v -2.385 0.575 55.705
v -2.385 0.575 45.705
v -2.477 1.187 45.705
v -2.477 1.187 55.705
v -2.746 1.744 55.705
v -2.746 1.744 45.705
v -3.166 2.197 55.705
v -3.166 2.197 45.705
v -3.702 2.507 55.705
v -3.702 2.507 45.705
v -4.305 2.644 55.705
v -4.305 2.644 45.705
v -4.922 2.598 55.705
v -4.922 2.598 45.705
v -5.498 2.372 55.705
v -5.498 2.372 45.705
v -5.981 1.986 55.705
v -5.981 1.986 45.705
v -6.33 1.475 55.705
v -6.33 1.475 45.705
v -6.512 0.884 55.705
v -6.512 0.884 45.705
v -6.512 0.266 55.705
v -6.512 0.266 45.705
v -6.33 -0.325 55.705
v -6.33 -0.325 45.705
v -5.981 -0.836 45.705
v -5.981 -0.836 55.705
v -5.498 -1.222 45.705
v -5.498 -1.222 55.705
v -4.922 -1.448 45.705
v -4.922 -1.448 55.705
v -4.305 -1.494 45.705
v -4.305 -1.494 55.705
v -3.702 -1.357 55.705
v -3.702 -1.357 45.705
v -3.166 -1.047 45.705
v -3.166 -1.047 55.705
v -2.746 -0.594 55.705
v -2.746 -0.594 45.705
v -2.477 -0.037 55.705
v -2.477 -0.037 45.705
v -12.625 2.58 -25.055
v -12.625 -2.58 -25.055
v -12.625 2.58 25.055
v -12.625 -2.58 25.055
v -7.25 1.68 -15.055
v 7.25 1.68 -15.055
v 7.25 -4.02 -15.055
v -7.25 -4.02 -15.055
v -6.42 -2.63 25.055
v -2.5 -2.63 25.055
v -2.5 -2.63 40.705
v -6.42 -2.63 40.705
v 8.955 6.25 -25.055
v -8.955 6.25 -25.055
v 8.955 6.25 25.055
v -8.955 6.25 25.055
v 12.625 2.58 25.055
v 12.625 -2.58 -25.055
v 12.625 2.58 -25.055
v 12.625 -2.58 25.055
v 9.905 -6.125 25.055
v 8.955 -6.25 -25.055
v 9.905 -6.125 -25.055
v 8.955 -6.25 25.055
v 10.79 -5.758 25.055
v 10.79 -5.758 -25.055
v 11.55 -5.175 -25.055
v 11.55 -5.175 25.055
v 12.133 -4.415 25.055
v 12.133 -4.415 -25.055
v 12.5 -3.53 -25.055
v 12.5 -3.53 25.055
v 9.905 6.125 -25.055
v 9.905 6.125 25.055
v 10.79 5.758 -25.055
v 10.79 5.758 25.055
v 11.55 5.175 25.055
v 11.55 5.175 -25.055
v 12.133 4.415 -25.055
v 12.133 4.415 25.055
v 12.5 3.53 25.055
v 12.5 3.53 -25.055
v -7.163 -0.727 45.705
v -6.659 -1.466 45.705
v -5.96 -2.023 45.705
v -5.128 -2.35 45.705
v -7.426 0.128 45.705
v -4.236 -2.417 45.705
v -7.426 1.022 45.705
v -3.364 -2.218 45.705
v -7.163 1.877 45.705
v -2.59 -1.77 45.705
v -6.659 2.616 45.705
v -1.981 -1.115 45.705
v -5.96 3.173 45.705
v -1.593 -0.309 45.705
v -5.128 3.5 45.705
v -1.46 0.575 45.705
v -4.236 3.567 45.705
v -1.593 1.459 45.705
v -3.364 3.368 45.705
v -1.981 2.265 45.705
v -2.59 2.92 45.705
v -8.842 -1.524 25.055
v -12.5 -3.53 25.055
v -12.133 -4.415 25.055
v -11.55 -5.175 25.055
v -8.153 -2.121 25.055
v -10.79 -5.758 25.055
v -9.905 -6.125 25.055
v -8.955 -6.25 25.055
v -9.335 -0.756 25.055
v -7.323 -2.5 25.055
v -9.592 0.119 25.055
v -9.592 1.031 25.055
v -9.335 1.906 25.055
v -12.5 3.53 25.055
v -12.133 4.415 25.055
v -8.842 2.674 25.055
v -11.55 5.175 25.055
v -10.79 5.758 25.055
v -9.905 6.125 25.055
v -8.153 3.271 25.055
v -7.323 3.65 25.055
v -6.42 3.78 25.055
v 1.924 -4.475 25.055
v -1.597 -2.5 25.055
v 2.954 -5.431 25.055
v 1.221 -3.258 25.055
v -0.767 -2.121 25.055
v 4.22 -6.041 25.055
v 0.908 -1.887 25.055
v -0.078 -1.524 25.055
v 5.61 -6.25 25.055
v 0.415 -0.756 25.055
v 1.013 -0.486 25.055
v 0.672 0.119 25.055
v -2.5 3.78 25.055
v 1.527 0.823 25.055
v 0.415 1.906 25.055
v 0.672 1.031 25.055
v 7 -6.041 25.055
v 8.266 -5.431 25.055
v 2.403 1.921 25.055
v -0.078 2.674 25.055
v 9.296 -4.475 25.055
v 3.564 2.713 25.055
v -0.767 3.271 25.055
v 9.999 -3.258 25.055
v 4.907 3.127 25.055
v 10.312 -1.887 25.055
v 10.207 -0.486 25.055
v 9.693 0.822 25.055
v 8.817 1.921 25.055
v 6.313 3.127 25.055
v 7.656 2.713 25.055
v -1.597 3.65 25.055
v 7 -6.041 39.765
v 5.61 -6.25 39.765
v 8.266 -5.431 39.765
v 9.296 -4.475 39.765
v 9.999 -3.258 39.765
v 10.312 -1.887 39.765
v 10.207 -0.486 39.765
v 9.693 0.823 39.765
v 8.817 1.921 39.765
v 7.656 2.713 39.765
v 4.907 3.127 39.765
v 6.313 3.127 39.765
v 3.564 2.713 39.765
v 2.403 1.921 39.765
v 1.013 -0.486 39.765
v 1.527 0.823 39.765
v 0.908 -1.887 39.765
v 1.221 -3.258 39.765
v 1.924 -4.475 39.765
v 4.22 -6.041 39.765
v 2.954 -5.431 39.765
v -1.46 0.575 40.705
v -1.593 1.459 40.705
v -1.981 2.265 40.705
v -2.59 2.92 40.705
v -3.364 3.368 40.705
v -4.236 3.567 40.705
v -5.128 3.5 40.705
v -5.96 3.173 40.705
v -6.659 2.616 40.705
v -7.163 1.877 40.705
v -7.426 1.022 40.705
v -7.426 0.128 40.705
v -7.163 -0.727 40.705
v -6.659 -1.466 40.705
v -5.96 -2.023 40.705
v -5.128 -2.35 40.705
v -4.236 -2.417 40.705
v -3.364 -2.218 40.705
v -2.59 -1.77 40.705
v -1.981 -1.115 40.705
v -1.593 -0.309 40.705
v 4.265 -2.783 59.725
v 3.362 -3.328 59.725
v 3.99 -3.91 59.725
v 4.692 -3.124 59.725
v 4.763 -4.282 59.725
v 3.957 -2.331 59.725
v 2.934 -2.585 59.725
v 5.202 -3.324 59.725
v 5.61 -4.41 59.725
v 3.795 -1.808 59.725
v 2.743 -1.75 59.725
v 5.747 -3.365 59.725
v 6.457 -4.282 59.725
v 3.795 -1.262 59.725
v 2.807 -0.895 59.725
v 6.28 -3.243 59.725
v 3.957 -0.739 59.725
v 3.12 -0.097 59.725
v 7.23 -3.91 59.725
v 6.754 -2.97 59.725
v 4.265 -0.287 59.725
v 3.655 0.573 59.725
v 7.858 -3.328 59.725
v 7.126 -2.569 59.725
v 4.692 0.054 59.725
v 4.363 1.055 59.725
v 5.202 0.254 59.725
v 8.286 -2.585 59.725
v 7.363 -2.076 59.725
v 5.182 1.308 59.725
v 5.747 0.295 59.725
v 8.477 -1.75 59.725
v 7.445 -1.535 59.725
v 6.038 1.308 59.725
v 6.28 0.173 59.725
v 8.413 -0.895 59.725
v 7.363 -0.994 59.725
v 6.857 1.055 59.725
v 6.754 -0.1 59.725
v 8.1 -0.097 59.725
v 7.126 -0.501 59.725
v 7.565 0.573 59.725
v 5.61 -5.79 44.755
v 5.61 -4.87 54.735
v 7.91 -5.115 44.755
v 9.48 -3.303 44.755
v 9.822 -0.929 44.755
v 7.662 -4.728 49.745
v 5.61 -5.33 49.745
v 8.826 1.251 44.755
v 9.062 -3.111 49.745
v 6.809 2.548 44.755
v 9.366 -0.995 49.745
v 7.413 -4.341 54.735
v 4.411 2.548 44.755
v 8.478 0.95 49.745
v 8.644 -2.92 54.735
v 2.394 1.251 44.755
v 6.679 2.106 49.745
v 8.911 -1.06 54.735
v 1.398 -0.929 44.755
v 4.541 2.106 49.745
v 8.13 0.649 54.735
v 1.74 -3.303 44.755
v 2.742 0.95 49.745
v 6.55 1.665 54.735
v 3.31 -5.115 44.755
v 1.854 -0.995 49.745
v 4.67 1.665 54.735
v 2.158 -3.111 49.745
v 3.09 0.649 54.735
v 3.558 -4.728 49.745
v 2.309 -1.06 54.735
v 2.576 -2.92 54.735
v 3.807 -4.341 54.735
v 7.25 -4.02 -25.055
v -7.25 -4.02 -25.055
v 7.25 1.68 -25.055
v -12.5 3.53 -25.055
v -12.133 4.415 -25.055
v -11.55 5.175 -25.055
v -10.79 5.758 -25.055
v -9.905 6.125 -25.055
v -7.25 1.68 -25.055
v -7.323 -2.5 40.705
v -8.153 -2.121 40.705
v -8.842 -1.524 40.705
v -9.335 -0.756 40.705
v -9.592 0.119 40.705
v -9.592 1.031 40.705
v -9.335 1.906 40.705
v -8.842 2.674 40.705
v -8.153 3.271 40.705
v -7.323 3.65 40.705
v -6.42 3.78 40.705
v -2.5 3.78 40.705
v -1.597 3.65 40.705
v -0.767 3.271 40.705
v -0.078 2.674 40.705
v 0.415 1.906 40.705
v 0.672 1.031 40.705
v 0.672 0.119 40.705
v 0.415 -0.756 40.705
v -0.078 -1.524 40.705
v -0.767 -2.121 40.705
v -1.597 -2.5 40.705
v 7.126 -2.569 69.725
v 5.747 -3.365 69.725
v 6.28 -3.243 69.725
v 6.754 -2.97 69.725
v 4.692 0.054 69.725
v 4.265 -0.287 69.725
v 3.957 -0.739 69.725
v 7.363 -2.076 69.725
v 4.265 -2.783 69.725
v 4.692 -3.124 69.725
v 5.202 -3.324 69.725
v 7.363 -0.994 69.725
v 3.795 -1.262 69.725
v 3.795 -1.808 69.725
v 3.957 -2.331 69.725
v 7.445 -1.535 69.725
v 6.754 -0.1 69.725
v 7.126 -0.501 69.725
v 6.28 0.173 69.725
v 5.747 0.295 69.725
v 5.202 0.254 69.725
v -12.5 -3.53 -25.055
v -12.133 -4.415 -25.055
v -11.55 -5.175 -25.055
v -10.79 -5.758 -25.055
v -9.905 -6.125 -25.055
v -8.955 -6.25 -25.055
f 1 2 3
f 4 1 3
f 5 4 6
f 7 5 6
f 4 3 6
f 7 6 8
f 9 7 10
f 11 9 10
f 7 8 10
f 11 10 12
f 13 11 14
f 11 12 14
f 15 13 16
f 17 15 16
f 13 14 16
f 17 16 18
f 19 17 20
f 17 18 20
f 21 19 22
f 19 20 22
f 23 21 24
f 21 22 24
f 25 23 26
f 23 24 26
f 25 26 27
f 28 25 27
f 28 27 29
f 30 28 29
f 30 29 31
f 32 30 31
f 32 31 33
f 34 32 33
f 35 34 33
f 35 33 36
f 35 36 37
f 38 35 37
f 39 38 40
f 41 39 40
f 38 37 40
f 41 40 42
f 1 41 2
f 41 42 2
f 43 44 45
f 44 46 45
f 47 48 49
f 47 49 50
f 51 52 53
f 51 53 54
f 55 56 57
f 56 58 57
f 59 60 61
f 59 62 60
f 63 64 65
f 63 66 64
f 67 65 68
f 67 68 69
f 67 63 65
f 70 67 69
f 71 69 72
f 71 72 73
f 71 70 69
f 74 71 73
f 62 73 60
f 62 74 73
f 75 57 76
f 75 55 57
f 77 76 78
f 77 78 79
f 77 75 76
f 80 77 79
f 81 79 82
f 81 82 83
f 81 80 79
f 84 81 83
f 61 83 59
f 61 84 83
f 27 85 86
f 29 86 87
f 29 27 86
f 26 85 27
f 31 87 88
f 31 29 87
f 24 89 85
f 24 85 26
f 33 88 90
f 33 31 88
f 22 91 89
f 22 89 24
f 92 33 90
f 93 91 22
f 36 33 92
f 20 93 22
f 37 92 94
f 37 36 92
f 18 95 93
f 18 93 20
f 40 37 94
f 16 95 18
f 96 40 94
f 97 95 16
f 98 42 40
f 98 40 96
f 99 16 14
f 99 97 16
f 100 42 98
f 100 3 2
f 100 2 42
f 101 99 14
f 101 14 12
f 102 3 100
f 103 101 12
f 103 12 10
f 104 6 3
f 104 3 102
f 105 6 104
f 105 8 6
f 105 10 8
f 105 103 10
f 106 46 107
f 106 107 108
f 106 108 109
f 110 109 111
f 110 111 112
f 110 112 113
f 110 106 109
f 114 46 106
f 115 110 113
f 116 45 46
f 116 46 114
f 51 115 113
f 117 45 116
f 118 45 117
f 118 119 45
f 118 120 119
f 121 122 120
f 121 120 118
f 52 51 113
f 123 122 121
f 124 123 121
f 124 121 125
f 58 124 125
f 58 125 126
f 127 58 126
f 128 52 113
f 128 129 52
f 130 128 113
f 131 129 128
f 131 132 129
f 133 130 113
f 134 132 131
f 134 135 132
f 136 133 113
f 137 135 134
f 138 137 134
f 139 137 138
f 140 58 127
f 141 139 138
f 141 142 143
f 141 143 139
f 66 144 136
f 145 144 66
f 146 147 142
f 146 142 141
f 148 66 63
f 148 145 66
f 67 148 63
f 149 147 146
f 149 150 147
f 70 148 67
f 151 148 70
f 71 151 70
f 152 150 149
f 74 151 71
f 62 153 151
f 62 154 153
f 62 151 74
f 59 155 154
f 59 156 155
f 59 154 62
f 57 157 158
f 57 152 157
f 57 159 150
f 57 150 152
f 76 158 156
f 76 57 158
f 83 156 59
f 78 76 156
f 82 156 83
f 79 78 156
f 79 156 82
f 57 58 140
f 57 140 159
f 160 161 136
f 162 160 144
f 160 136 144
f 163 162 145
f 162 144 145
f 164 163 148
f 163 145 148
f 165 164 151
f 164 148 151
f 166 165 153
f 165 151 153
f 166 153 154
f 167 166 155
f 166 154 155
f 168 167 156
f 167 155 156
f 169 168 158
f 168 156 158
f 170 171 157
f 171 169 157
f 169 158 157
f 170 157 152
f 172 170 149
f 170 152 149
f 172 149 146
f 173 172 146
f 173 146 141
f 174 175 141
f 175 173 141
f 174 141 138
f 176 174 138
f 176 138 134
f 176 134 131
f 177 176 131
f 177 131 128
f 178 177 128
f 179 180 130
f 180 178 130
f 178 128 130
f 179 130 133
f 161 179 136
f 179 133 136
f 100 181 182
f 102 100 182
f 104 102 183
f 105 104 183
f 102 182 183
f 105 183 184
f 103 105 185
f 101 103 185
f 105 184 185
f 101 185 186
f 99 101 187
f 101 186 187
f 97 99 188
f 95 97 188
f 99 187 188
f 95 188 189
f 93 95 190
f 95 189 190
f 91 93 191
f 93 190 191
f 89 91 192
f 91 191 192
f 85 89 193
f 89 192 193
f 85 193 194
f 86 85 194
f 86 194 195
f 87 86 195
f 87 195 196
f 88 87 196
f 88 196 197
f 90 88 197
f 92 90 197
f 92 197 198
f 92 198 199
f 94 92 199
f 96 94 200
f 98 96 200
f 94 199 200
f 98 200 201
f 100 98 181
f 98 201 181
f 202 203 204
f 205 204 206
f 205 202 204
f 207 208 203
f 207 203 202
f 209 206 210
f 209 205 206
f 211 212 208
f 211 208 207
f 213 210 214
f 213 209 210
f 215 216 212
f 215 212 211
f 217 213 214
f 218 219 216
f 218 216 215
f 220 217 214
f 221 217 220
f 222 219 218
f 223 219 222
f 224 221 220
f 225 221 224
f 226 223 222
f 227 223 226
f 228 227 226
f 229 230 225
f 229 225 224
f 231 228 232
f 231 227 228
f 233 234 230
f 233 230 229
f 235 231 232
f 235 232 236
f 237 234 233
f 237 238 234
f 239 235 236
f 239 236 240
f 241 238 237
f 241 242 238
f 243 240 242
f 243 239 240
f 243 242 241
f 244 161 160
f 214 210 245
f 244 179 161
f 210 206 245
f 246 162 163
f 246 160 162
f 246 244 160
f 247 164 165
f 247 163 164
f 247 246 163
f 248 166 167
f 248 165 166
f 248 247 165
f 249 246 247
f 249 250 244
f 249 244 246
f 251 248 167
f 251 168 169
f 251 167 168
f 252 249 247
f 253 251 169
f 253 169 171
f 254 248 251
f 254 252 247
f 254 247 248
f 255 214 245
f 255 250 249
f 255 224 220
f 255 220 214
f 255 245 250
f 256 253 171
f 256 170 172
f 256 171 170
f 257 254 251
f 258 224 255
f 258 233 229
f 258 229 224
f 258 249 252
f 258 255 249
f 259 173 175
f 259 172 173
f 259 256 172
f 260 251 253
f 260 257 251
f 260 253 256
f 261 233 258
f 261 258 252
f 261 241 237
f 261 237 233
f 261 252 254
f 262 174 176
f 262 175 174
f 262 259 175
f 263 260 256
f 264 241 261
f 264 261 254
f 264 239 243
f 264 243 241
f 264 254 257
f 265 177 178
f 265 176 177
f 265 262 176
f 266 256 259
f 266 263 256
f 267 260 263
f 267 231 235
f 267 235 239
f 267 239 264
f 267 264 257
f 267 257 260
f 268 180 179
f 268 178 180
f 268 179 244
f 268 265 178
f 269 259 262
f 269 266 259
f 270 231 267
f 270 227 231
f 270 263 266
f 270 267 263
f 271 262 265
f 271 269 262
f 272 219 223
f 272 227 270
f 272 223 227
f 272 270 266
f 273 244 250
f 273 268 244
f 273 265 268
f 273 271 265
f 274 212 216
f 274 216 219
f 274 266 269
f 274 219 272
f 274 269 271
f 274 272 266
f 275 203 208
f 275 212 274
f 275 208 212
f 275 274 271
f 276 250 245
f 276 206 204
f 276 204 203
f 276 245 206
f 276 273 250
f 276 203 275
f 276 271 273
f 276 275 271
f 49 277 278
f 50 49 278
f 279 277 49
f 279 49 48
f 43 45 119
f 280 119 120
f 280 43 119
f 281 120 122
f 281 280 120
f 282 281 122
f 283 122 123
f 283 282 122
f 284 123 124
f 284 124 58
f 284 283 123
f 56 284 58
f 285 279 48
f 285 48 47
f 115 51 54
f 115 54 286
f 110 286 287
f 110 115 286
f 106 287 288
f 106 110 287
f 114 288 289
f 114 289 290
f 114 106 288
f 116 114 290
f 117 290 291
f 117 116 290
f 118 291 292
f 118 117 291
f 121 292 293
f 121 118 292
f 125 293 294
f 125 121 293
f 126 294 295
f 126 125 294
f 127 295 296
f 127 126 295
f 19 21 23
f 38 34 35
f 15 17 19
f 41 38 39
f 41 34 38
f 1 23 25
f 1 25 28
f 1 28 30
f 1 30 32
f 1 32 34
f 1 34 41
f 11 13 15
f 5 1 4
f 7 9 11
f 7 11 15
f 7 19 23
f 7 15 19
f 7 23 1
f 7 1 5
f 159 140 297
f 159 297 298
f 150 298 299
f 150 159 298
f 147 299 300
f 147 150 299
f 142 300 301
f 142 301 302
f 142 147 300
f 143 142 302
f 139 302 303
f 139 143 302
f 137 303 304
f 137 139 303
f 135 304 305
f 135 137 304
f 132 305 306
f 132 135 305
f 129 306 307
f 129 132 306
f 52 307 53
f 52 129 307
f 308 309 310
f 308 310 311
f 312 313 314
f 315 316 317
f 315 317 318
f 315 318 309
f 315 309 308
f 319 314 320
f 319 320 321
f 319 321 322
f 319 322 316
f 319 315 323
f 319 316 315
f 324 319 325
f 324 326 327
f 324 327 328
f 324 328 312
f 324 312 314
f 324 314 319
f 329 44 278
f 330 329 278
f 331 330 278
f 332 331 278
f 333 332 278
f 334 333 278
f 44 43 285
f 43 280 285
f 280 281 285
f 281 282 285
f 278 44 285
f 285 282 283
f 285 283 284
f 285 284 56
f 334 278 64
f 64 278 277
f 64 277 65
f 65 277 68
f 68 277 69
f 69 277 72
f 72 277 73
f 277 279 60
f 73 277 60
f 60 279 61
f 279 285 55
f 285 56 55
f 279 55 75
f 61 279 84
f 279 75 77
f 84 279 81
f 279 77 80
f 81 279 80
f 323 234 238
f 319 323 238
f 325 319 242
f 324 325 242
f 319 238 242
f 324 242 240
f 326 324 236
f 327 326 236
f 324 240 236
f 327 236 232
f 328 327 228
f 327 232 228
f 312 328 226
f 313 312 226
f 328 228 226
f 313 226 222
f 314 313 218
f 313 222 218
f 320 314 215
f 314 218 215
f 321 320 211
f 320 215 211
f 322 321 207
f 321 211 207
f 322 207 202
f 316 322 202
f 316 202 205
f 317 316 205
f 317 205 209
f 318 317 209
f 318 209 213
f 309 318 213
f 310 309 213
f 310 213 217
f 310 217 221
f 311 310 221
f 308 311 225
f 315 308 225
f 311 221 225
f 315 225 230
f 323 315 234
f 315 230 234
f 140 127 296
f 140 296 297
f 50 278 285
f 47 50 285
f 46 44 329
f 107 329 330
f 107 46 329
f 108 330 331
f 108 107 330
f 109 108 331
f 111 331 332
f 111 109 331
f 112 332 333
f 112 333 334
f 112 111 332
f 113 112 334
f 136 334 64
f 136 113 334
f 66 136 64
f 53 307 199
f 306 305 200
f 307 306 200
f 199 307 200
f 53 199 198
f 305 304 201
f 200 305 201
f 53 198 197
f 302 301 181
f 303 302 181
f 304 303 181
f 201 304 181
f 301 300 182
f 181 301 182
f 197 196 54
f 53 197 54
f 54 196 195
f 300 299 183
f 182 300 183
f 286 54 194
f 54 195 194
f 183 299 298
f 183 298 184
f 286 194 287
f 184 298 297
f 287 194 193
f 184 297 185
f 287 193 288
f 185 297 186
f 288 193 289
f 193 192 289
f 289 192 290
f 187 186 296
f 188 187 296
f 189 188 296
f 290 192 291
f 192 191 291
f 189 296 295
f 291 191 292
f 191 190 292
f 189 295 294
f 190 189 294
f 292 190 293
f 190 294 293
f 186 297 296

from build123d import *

# Parameters (mm, degrees)
SKETCH1_W           = 25.25
SKETCH1_H           = 12.5
BOSS_EXTRUDE1_DEPTH = 25.055
SKETCH2_W           = 14.5
SKETCH2_H           = 5.7
CUT_EXTRUDE1_DEPTH  = 10
BOSS_EXTRUDE2_DEPTH = 15.65
SKETCH4_R           = 4.715
BOSS_EXTRUDE3_DEPTH = 14.71
SKETCH5_R           = 2.875
SKETCH6_R           = 1.835
BOSS_EXTRUDE4_DEPTH = 10
SKETCH7_R           = 3
BOSS_EXTRUDE5_DEPTH = 5
SKETCH8_R           = 2.075
BOSS_EXTRUDE6_DEPTH = 10
FILLET1_R           = 3.67


with BuildPart() as part:
    # Sketch1 → Boss-Extrude1 (new, symmetric)
    with BuildSketch(Plane.XY):
        Rectangle(SKETCH1_W, SKETCH1_H)
    extrude(amount=BOSS_EXTRUDE1_DEPTH, both=True)

    # Sketch2 → Cut-Extrude1 (cut)
    with BuildSketch(Plane(origin=(0, 0, -25.055), x_dir=(-1, 0, 0), z_dir=(0, 0, -1))):
        with Locations((0, -1.17)):
            Rectangle(SKETCH2_W, SKETCH2_H)
    extrude(amount=-CUT_EXTRUDE1_DEPTH, mode=Mode.SUBTRACT)

    # Sketch3 → Boss-Extrude2 (add)
    with BuildSketch(Plane.XY.offset(25.055)):
        with BuildLine():
            Line((-6.42, 3.78), (-2.5, 3.78))
            ThreePointArc((-2.5, 3.78), (0.705, 0.575), (-2.5, -2.63))
            Line((-2.5, -2.63), (-6.42, -2.63))
            ThreePointArc((-6.42, -2.63), (-9.625, 0.575), (-6.42, 3.78))
        make_face()
    extrude(amount=BOSS_EXTRUDE2_DEPTH)

    # Sketch4 → Boss-Extrude3 (add)
    with BuildSketch(Plane.XY.offset(25.055)):
        with Locations(Location((5.61, -1.535, 0), (0, 0, 270))):
            Circle(SKETCH4_R)
    extrude(amount=BOSS_EXTRUDE3_DEPTH)

    # Sketch5 → section 1 of loft1
    with BuildSketch(Plane.XY.offset(59.725), mode=Mode.PRIVATE) as loft1_s1:
        with Locations((5.61, -1.535)):
            Circle(SKETCH5_R)
    # loft from a face of the part (loft1)
    loft([part.faces().sort_by_distance((5.61, -1.535, 39.765))[0], loft1_s1.sketch])

    # Sketch6 → Boss-Extrude4 (add)
    with BuildSketch(Plane.XY.offset(59.725)):
        with Locations((5.61, -1.535)):
            Circle(SKETCH6_R)
    extrude(amount=BOSS_EXTRUDE4_DEPTH)

    # Sketch7 → Boss-Extrude5 (add)
    with BuildSketch(Plane.XY.offset(40.705)):
        with Locations((-4.46, 0.575)):
            Circle(SKETCH7_R)
    extrude(amount=BOSS_EXTRUDE5_DEPTH)

    # Sketch8 → Boss-Extrude6 (add)
    with BuildSketch(Plane.XY.offset(45.705)):
        with Locations((-4.46, 0.575)):
            Circle(SKETCH8_R)
    extrude(amount=BOSS_EXTRUDE6_DEPTH)

    # Fillet1
    fillet1_edges = [part.edges().sort_by_distance(p)[0] for p in [
        (12.625, -6.25, 0),
        (-12.625, -6.25, 0),
        (-12.625, 6.25, 0),
        (12.625, 6.25, 0),
    ]]
    fillet(fillet1_edges, radius=FILLET1_R)


solid = part.part
